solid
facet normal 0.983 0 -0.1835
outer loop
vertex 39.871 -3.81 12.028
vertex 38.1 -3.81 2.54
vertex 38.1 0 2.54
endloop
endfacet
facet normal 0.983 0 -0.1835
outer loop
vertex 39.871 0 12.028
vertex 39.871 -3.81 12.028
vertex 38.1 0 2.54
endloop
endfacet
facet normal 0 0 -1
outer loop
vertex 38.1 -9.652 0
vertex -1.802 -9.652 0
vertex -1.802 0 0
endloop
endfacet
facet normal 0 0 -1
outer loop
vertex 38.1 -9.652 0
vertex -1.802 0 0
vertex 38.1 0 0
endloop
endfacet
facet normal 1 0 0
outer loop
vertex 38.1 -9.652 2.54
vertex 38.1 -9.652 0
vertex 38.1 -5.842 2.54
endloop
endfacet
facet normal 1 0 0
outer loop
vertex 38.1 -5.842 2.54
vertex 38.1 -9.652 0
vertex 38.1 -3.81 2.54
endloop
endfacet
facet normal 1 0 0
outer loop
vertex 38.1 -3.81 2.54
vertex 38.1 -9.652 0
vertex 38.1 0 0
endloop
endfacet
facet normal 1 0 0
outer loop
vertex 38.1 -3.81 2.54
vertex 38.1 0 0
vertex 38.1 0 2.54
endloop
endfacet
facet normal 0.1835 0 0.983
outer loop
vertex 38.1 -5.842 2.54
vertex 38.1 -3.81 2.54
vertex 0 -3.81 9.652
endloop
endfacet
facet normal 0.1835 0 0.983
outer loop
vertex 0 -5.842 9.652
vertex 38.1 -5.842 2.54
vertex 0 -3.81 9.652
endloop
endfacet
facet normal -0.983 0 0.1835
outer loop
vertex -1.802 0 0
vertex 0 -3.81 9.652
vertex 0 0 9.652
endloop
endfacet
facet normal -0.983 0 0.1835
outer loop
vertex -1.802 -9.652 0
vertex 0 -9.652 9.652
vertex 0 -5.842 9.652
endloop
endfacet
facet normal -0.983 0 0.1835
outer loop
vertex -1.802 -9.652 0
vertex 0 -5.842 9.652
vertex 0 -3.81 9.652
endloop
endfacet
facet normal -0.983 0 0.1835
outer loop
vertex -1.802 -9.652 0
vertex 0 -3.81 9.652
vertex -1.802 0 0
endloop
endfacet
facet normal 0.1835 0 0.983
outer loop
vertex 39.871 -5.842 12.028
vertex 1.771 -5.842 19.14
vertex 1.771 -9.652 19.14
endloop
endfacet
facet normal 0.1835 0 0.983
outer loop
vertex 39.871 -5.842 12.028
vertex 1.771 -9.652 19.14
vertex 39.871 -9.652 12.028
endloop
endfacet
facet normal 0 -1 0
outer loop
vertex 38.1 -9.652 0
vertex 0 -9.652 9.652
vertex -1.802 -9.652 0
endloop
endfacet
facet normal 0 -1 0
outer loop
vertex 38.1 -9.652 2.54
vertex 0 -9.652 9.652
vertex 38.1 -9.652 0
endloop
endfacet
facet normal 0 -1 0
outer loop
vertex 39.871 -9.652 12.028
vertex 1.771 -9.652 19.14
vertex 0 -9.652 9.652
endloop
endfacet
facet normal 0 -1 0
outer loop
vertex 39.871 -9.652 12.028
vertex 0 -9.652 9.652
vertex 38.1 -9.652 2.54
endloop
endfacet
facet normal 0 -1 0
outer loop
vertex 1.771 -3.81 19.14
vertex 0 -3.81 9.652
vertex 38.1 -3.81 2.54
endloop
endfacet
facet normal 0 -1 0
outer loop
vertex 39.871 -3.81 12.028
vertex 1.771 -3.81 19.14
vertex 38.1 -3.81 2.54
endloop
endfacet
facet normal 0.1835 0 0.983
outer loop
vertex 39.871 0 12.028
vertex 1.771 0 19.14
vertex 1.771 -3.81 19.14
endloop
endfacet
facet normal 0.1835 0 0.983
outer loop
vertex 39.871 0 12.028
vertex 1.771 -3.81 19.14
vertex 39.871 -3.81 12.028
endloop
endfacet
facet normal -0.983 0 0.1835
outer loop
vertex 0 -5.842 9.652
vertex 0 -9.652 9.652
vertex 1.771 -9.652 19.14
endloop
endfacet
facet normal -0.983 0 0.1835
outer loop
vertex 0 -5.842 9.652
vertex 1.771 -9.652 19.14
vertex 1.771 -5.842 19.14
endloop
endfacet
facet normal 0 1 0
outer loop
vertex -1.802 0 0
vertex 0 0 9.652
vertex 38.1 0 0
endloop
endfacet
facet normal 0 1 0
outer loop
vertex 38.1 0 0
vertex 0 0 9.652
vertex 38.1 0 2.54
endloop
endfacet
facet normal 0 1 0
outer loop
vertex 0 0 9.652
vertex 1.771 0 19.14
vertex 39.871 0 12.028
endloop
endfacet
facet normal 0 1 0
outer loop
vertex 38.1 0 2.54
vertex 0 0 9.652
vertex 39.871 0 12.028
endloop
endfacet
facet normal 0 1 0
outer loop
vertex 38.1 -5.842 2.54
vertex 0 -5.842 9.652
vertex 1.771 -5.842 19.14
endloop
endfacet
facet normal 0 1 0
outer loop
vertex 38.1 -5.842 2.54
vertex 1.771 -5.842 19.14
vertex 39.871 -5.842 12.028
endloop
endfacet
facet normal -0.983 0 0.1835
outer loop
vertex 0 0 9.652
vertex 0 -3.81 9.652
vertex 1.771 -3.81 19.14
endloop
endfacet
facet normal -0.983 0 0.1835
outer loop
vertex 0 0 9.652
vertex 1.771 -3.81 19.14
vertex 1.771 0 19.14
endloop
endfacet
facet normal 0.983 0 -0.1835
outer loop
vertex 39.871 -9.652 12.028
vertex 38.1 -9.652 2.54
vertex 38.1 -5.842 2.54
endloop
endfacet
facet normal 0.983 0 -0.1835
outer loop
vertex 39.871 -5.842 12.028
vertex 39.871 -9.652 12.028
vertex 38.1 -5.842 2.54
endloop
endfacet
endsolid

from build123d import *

# Parameters (mm, degrees)
F1_DEPTH = 9.652
F2_W     = 38.7581029464
F2_H     = 3.81
F3_DEPTH = 9.652
F5_DEPTH = 9.652


with BuildPart() as f1:
    # F0 (on Front) → F1 (new body)
    with BuildSketch(Plane.XZ):
        Polygon((0, 9.652), (0, 0), (38.1, 0), (38.1, 2.54), align=None)
    extrude(amount=F1_DEPTH)

    # F2 (on face) → F3 (join)
    with BuildSketch(Plane(origin=(1.7410410582, 0, 9.3270056691), x_dir=(0.9830202488, 0, -0.1834971131), z_dir=(0.1834971131, 0, 0.9830202488))):
        with Locations((17.6079373375, -7.747)):
            Rectangle(F2_W, F2_H)
        with Locations((17.6079373375, -1.905)):
            Rectangle(F2_W, F2_H)
    extrude(amount=F3_DEPTH)

    # F4 (on face) → F5 (join)
    with BuildSketch(Plane.XZ.offset(9.652)):
        Polygon((0, 0), (0, 9.652), (-1.8017066667, 0), align=None)
    extrude(amount=-F5_DEPTH)


solid = f1.part
